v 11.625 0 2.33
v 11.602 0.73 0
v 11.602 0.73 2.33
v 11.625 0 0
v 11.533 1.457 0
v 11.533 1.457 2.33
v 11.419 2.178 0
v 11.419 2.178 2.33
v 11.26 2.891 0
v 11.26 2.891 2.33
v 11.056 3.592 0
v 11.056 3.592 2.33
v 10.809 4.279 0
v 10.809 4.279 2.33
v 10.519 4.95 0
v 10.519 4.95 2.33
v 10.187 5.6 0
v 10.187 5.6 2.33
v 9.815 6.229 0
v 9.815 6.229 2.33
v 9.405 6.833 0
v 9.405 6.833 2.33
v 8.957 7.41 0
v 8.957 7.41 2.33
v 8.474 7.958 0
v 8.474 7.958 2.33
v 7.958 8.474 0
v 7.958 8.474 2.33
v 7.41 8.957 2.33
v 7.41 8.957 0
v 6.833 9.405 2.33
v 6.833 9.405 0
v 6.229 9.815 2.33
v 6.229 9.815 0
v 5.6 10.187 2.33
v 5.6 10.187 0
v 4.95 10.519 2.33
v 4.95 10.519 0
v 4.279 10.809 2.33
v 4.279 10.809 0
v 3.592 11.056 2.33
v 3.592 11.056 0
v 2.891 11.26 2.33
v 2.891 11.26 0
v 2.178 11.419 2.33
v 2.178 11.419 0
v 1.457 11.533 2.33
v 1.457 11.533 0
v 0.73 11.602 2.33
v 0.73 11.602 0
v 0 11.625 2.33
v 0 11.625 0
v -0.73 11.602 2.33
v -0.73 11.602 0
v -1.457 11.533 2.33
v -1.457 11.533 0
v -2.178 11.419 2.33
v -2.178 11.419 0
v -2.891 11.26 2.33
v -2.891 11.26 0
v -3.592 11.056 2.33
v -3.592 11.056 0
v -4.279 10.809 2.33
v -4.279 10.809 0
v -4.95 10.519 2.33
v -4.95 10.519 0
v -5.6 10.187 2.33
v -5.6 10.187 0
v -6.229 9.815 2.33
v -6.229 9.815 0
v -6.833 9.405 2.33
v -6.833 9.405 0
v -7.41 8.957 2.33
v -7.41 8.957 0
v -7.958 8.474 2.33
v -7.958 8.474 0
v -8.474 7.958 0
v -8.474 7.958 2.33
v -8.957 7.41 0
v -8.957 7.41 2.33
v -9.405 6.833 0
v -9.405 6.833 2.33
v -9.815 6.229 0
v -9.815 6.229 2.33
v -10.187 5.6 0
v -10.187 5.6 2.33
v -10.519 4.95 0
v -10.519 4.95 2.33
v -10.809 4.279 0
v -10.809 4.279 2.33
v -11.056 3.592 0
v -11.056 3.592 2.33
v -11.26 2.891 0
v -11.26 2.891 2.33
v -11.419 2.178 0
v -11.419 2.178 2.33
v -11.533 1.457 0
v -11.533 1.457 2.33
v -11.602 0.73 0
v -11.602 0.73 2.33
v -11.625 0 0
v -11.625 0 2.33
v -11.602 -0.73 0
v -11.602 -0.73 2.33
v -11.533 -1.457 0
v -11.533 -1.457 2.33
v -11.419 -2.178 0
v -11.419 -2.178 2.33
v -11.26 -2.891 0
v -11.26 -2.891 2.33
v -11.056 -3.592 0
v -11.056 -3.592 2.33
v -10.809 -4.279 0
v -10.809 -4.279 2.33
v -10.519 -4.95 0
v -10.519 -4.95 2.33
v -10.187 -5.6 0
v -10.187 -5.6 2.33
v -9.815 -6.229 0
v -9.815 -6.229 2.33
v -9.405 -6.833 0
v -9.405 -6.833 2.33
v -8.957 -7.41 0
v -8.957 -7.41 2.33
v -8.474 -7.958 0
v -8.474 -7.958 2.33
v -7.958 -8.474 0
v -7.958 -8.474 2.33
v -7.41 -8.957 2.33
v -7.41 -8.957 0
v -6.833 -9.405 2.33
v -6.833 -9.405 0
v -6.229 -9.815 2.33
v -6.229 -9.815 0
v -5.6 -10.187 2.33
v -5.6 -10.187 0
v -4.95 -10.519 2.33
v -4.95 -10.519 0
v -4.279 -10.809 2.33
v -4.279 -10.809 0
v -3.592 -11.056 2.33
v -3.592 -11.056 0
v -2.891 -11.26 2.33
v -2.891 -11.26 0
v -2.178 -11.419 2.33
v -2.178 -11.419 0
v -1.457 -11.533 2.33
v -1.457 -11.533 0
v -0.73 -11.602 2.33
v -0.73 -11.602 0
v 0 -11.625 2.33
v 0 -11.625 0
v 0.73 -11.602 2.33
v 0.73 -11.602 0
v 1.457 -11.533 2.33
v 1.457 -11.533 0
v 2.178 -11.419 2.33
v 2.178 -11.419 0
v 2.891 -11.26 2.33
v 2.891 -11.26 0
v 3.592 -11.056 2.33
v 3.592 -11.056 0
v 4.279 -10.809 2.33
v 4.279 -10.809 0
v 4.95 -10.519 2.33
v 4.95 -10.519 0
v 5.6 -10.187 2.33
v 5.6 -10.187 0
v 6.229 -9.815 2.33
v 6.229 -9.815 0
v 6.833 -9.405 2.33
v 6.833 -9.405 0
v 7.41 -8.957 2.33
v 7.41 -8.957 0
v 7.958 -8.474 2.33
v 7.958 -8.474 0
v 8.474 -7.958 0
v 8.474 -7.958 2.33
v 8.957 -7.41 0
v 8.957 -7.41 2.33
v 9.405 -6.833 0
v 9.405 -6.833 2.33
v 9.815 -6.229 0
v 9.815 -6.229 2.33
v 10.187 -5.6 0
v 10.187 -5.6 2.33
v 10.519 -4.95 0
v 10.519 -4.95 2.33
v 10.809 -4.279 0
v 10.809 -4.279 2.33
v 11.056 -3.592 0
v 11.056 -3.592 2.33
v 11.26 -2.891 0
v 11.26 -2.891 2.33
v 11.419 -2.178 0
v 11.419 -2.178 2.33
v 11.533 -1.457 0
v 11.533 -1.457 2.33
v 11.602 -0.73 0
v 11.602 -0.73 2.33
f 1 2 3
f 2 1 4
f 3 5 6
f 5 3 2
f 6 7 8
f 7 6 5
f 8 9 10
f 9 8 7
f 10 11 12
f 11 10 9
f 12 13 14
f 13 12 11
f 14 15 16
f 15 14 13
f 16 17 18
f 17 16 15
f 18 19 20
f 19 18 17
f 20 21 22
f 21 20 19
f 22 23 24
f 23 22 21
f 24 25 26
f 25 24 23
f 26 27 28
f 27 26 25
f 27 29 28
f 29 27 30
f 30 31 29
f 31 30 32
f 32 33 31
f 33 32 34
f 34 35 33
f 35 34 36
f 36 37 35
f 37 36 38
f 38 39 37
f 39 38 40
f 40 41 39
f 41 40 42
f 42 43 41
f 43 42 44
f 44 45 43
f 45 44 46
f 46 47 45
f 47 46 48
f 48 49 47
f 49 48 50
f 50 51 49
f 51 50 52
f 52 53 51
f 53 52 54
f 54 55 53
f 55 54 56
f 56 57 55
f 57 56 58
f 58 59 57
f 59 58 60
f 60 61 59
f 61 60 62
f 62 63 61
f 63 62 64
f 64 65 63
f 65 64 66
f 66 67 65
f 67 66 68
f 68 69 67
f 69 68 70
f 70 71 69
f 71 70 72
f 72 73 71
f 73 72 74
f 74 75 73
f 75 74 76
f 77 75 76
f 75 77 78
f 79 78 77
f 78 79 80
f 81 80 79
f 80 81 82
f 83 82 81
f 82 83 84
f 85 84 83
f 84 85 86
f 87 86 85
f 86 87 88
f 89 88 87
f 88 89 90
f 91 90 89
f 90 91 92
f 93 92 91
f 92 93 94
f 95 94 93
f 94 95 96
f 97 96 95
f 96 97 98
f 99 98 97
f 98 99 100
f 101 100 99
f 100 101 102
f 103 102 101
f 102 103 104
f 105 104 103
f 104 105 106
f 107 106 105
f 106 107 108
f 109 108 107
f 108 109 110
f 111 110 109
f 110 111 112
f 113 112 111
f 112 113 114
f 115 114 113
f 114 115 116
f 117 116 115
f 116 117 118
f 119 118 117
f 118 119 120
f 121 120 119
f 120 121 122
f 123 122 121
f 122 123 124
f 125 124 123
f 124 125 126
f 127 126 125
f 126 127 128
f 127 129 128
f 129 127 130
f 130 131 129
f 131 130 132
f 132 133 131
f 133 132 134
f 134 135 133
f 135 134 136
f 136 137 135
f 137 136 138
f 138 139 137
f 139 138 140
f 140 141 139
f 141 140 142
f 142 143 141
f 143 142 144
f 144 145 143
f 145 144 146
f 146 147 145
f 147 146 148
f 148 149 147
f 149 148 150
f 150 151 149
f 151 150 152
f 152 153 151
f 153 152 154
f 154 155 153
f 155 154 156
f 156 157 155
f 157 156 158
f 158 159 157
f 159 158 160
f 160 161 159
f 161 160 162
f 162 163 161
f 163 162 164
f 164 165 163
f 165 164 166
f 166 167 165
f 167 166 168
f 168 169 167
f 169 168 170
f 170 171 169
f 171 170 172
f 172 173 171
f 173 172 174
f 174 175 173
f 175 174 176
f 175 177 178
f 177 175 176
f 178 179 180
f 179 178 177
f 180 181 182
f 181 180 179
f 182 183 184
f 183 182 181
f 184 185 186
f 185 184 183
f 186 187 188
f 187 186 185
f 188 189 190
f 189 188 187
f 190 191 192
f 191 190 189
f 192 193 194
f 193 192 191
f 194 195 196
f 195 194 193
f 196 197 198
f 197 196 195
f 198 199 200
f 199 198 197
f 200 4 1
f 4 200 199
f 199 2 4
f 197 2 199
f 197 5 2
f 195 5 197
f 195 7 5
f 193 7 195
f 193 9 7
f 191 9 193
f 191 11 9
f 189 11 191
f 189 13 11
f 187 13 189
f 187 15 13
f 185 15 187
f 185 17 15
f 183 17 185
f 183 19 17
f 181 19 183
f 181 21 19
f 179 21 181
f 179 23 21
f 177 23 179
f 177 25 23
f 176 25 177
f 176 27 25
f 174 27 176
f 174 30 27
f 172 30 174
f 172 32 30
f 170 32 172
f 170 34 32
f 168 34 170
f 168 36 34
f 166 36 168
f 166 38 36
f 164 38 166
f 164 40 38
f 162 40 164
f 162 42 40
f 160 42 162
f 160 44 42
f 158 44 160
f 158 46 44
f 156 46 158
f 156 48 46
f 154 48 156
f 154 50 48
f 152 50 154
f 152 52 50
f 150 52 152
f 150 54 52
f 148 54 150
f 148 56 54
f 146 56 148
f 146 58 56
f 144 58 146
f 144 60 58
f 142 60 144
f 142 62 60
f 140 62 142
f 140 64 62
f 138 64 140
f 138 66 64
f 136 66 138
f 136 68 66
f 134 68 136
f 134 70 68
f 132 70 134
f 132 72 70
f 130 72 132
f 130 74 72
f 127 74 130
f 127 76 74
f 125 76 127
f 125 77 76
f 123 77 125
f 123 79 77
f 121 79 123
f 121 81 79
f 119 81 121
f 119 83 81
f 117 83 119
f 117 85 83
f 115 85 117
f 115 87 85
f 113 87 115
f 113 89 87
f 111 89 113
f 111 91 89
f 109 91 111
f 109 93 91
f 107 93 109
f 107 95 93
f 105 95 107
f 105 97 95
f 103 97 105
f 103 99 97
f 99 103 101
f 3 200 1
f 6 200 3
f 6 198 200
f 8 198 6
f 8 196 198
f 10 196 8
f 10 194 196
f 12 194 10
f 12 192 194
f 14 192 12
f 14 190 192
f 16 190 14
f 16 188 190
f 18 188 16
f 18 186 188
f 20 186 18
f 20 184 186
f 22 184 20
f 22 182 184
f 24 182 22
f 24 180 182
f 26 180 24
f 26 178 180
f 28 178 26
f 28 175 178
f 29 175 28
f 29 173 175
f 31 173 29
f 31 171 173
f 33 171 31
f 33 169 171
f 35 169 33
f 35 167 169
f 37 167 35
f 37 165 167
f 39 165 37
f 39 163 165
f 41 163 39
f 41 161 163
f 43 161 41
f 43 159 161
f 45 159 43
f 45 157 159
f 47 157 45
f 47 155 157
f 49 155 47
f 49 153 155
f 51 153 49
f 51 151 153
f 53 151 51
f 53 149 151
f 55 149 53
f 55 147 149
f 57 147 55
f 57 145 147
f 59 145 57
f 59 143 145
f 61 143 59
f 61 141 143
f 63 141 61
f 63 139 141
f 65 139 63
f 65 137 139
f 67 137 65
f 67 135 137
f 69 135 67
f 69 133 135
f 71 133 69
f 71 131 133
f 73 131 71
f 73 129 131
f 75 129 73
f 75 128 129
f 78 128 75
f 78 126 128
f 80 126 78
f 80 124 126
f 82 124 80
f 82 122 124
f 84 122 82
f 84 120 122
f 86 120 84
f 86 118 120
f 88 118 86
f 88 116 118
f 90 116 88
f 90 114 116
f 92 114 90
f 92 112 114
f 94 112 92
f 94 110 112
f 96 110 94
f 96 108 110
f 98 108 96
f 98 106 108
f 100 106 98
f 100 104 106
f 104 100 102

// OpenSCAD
/*
This is a pretty basic calibration piece, howsoever it is more powerfull then it seems. 
By uncommenting _one_ of the avaliable coins on the bottom of this code you can generate a calibration piece which should have the exact measures (height and diameter) for the Euro piece you have avaliable. There's not much to do, simply uncomment your favorite calibration coin, export the stl (Design -> export STL), slice it, print it, put your coin in the center and calibrate.
For reference: the measures were taken from this [0] German Wikipedia article

[0]https://de.wikipedia.org/wiki/Eurom%FCnzen#Beschreibung
*/


module one_cent(){
	diameter = 16.25;
	height = 1.67;
	square(diameter, height);
}

module two_cent(){
	diameter = 18.75;
	height = 1.67;
	square(diameter, height);
}	

module five_cent(){
	diameter = 21.25;
	height = 1.67;
	square(diameter, height);
}

module ten_cent(){
	diameter = 19.75;
	height = 1.93;
	square(diameter, height);
}

module twenty_cent(){
	diameter = 22.25;
	height= 2.14;
	square(diameter, height);
}

module fifty_cent(){
	diameter = 24.25;
	height = 2.38;
	square(diameter, height);
}

module one_euro(){
	diameter = 23.25;
	height = 2.33;
	square(diameter, height);
}

module two_euro(){
	diameter = 25.75;
	height = 2.2;
	square(diameter, height);
}

module square(diameter, height){
	radius = diameter/2;	
	difference(){
		cube([diameter+5,diameter+5,height]);
		translate([radius+2.5,radius+2.5,-1])
		!cylinder(r = radius, h = height, $fn=100);
	}
}

// ====== Uncomment only one of the below coins =======

//one_cent();
//two_cent();
//five_cent();
//ten_cent();
//twenty_cent();
//fifty_cent();
one_euro();
//two_euro();
